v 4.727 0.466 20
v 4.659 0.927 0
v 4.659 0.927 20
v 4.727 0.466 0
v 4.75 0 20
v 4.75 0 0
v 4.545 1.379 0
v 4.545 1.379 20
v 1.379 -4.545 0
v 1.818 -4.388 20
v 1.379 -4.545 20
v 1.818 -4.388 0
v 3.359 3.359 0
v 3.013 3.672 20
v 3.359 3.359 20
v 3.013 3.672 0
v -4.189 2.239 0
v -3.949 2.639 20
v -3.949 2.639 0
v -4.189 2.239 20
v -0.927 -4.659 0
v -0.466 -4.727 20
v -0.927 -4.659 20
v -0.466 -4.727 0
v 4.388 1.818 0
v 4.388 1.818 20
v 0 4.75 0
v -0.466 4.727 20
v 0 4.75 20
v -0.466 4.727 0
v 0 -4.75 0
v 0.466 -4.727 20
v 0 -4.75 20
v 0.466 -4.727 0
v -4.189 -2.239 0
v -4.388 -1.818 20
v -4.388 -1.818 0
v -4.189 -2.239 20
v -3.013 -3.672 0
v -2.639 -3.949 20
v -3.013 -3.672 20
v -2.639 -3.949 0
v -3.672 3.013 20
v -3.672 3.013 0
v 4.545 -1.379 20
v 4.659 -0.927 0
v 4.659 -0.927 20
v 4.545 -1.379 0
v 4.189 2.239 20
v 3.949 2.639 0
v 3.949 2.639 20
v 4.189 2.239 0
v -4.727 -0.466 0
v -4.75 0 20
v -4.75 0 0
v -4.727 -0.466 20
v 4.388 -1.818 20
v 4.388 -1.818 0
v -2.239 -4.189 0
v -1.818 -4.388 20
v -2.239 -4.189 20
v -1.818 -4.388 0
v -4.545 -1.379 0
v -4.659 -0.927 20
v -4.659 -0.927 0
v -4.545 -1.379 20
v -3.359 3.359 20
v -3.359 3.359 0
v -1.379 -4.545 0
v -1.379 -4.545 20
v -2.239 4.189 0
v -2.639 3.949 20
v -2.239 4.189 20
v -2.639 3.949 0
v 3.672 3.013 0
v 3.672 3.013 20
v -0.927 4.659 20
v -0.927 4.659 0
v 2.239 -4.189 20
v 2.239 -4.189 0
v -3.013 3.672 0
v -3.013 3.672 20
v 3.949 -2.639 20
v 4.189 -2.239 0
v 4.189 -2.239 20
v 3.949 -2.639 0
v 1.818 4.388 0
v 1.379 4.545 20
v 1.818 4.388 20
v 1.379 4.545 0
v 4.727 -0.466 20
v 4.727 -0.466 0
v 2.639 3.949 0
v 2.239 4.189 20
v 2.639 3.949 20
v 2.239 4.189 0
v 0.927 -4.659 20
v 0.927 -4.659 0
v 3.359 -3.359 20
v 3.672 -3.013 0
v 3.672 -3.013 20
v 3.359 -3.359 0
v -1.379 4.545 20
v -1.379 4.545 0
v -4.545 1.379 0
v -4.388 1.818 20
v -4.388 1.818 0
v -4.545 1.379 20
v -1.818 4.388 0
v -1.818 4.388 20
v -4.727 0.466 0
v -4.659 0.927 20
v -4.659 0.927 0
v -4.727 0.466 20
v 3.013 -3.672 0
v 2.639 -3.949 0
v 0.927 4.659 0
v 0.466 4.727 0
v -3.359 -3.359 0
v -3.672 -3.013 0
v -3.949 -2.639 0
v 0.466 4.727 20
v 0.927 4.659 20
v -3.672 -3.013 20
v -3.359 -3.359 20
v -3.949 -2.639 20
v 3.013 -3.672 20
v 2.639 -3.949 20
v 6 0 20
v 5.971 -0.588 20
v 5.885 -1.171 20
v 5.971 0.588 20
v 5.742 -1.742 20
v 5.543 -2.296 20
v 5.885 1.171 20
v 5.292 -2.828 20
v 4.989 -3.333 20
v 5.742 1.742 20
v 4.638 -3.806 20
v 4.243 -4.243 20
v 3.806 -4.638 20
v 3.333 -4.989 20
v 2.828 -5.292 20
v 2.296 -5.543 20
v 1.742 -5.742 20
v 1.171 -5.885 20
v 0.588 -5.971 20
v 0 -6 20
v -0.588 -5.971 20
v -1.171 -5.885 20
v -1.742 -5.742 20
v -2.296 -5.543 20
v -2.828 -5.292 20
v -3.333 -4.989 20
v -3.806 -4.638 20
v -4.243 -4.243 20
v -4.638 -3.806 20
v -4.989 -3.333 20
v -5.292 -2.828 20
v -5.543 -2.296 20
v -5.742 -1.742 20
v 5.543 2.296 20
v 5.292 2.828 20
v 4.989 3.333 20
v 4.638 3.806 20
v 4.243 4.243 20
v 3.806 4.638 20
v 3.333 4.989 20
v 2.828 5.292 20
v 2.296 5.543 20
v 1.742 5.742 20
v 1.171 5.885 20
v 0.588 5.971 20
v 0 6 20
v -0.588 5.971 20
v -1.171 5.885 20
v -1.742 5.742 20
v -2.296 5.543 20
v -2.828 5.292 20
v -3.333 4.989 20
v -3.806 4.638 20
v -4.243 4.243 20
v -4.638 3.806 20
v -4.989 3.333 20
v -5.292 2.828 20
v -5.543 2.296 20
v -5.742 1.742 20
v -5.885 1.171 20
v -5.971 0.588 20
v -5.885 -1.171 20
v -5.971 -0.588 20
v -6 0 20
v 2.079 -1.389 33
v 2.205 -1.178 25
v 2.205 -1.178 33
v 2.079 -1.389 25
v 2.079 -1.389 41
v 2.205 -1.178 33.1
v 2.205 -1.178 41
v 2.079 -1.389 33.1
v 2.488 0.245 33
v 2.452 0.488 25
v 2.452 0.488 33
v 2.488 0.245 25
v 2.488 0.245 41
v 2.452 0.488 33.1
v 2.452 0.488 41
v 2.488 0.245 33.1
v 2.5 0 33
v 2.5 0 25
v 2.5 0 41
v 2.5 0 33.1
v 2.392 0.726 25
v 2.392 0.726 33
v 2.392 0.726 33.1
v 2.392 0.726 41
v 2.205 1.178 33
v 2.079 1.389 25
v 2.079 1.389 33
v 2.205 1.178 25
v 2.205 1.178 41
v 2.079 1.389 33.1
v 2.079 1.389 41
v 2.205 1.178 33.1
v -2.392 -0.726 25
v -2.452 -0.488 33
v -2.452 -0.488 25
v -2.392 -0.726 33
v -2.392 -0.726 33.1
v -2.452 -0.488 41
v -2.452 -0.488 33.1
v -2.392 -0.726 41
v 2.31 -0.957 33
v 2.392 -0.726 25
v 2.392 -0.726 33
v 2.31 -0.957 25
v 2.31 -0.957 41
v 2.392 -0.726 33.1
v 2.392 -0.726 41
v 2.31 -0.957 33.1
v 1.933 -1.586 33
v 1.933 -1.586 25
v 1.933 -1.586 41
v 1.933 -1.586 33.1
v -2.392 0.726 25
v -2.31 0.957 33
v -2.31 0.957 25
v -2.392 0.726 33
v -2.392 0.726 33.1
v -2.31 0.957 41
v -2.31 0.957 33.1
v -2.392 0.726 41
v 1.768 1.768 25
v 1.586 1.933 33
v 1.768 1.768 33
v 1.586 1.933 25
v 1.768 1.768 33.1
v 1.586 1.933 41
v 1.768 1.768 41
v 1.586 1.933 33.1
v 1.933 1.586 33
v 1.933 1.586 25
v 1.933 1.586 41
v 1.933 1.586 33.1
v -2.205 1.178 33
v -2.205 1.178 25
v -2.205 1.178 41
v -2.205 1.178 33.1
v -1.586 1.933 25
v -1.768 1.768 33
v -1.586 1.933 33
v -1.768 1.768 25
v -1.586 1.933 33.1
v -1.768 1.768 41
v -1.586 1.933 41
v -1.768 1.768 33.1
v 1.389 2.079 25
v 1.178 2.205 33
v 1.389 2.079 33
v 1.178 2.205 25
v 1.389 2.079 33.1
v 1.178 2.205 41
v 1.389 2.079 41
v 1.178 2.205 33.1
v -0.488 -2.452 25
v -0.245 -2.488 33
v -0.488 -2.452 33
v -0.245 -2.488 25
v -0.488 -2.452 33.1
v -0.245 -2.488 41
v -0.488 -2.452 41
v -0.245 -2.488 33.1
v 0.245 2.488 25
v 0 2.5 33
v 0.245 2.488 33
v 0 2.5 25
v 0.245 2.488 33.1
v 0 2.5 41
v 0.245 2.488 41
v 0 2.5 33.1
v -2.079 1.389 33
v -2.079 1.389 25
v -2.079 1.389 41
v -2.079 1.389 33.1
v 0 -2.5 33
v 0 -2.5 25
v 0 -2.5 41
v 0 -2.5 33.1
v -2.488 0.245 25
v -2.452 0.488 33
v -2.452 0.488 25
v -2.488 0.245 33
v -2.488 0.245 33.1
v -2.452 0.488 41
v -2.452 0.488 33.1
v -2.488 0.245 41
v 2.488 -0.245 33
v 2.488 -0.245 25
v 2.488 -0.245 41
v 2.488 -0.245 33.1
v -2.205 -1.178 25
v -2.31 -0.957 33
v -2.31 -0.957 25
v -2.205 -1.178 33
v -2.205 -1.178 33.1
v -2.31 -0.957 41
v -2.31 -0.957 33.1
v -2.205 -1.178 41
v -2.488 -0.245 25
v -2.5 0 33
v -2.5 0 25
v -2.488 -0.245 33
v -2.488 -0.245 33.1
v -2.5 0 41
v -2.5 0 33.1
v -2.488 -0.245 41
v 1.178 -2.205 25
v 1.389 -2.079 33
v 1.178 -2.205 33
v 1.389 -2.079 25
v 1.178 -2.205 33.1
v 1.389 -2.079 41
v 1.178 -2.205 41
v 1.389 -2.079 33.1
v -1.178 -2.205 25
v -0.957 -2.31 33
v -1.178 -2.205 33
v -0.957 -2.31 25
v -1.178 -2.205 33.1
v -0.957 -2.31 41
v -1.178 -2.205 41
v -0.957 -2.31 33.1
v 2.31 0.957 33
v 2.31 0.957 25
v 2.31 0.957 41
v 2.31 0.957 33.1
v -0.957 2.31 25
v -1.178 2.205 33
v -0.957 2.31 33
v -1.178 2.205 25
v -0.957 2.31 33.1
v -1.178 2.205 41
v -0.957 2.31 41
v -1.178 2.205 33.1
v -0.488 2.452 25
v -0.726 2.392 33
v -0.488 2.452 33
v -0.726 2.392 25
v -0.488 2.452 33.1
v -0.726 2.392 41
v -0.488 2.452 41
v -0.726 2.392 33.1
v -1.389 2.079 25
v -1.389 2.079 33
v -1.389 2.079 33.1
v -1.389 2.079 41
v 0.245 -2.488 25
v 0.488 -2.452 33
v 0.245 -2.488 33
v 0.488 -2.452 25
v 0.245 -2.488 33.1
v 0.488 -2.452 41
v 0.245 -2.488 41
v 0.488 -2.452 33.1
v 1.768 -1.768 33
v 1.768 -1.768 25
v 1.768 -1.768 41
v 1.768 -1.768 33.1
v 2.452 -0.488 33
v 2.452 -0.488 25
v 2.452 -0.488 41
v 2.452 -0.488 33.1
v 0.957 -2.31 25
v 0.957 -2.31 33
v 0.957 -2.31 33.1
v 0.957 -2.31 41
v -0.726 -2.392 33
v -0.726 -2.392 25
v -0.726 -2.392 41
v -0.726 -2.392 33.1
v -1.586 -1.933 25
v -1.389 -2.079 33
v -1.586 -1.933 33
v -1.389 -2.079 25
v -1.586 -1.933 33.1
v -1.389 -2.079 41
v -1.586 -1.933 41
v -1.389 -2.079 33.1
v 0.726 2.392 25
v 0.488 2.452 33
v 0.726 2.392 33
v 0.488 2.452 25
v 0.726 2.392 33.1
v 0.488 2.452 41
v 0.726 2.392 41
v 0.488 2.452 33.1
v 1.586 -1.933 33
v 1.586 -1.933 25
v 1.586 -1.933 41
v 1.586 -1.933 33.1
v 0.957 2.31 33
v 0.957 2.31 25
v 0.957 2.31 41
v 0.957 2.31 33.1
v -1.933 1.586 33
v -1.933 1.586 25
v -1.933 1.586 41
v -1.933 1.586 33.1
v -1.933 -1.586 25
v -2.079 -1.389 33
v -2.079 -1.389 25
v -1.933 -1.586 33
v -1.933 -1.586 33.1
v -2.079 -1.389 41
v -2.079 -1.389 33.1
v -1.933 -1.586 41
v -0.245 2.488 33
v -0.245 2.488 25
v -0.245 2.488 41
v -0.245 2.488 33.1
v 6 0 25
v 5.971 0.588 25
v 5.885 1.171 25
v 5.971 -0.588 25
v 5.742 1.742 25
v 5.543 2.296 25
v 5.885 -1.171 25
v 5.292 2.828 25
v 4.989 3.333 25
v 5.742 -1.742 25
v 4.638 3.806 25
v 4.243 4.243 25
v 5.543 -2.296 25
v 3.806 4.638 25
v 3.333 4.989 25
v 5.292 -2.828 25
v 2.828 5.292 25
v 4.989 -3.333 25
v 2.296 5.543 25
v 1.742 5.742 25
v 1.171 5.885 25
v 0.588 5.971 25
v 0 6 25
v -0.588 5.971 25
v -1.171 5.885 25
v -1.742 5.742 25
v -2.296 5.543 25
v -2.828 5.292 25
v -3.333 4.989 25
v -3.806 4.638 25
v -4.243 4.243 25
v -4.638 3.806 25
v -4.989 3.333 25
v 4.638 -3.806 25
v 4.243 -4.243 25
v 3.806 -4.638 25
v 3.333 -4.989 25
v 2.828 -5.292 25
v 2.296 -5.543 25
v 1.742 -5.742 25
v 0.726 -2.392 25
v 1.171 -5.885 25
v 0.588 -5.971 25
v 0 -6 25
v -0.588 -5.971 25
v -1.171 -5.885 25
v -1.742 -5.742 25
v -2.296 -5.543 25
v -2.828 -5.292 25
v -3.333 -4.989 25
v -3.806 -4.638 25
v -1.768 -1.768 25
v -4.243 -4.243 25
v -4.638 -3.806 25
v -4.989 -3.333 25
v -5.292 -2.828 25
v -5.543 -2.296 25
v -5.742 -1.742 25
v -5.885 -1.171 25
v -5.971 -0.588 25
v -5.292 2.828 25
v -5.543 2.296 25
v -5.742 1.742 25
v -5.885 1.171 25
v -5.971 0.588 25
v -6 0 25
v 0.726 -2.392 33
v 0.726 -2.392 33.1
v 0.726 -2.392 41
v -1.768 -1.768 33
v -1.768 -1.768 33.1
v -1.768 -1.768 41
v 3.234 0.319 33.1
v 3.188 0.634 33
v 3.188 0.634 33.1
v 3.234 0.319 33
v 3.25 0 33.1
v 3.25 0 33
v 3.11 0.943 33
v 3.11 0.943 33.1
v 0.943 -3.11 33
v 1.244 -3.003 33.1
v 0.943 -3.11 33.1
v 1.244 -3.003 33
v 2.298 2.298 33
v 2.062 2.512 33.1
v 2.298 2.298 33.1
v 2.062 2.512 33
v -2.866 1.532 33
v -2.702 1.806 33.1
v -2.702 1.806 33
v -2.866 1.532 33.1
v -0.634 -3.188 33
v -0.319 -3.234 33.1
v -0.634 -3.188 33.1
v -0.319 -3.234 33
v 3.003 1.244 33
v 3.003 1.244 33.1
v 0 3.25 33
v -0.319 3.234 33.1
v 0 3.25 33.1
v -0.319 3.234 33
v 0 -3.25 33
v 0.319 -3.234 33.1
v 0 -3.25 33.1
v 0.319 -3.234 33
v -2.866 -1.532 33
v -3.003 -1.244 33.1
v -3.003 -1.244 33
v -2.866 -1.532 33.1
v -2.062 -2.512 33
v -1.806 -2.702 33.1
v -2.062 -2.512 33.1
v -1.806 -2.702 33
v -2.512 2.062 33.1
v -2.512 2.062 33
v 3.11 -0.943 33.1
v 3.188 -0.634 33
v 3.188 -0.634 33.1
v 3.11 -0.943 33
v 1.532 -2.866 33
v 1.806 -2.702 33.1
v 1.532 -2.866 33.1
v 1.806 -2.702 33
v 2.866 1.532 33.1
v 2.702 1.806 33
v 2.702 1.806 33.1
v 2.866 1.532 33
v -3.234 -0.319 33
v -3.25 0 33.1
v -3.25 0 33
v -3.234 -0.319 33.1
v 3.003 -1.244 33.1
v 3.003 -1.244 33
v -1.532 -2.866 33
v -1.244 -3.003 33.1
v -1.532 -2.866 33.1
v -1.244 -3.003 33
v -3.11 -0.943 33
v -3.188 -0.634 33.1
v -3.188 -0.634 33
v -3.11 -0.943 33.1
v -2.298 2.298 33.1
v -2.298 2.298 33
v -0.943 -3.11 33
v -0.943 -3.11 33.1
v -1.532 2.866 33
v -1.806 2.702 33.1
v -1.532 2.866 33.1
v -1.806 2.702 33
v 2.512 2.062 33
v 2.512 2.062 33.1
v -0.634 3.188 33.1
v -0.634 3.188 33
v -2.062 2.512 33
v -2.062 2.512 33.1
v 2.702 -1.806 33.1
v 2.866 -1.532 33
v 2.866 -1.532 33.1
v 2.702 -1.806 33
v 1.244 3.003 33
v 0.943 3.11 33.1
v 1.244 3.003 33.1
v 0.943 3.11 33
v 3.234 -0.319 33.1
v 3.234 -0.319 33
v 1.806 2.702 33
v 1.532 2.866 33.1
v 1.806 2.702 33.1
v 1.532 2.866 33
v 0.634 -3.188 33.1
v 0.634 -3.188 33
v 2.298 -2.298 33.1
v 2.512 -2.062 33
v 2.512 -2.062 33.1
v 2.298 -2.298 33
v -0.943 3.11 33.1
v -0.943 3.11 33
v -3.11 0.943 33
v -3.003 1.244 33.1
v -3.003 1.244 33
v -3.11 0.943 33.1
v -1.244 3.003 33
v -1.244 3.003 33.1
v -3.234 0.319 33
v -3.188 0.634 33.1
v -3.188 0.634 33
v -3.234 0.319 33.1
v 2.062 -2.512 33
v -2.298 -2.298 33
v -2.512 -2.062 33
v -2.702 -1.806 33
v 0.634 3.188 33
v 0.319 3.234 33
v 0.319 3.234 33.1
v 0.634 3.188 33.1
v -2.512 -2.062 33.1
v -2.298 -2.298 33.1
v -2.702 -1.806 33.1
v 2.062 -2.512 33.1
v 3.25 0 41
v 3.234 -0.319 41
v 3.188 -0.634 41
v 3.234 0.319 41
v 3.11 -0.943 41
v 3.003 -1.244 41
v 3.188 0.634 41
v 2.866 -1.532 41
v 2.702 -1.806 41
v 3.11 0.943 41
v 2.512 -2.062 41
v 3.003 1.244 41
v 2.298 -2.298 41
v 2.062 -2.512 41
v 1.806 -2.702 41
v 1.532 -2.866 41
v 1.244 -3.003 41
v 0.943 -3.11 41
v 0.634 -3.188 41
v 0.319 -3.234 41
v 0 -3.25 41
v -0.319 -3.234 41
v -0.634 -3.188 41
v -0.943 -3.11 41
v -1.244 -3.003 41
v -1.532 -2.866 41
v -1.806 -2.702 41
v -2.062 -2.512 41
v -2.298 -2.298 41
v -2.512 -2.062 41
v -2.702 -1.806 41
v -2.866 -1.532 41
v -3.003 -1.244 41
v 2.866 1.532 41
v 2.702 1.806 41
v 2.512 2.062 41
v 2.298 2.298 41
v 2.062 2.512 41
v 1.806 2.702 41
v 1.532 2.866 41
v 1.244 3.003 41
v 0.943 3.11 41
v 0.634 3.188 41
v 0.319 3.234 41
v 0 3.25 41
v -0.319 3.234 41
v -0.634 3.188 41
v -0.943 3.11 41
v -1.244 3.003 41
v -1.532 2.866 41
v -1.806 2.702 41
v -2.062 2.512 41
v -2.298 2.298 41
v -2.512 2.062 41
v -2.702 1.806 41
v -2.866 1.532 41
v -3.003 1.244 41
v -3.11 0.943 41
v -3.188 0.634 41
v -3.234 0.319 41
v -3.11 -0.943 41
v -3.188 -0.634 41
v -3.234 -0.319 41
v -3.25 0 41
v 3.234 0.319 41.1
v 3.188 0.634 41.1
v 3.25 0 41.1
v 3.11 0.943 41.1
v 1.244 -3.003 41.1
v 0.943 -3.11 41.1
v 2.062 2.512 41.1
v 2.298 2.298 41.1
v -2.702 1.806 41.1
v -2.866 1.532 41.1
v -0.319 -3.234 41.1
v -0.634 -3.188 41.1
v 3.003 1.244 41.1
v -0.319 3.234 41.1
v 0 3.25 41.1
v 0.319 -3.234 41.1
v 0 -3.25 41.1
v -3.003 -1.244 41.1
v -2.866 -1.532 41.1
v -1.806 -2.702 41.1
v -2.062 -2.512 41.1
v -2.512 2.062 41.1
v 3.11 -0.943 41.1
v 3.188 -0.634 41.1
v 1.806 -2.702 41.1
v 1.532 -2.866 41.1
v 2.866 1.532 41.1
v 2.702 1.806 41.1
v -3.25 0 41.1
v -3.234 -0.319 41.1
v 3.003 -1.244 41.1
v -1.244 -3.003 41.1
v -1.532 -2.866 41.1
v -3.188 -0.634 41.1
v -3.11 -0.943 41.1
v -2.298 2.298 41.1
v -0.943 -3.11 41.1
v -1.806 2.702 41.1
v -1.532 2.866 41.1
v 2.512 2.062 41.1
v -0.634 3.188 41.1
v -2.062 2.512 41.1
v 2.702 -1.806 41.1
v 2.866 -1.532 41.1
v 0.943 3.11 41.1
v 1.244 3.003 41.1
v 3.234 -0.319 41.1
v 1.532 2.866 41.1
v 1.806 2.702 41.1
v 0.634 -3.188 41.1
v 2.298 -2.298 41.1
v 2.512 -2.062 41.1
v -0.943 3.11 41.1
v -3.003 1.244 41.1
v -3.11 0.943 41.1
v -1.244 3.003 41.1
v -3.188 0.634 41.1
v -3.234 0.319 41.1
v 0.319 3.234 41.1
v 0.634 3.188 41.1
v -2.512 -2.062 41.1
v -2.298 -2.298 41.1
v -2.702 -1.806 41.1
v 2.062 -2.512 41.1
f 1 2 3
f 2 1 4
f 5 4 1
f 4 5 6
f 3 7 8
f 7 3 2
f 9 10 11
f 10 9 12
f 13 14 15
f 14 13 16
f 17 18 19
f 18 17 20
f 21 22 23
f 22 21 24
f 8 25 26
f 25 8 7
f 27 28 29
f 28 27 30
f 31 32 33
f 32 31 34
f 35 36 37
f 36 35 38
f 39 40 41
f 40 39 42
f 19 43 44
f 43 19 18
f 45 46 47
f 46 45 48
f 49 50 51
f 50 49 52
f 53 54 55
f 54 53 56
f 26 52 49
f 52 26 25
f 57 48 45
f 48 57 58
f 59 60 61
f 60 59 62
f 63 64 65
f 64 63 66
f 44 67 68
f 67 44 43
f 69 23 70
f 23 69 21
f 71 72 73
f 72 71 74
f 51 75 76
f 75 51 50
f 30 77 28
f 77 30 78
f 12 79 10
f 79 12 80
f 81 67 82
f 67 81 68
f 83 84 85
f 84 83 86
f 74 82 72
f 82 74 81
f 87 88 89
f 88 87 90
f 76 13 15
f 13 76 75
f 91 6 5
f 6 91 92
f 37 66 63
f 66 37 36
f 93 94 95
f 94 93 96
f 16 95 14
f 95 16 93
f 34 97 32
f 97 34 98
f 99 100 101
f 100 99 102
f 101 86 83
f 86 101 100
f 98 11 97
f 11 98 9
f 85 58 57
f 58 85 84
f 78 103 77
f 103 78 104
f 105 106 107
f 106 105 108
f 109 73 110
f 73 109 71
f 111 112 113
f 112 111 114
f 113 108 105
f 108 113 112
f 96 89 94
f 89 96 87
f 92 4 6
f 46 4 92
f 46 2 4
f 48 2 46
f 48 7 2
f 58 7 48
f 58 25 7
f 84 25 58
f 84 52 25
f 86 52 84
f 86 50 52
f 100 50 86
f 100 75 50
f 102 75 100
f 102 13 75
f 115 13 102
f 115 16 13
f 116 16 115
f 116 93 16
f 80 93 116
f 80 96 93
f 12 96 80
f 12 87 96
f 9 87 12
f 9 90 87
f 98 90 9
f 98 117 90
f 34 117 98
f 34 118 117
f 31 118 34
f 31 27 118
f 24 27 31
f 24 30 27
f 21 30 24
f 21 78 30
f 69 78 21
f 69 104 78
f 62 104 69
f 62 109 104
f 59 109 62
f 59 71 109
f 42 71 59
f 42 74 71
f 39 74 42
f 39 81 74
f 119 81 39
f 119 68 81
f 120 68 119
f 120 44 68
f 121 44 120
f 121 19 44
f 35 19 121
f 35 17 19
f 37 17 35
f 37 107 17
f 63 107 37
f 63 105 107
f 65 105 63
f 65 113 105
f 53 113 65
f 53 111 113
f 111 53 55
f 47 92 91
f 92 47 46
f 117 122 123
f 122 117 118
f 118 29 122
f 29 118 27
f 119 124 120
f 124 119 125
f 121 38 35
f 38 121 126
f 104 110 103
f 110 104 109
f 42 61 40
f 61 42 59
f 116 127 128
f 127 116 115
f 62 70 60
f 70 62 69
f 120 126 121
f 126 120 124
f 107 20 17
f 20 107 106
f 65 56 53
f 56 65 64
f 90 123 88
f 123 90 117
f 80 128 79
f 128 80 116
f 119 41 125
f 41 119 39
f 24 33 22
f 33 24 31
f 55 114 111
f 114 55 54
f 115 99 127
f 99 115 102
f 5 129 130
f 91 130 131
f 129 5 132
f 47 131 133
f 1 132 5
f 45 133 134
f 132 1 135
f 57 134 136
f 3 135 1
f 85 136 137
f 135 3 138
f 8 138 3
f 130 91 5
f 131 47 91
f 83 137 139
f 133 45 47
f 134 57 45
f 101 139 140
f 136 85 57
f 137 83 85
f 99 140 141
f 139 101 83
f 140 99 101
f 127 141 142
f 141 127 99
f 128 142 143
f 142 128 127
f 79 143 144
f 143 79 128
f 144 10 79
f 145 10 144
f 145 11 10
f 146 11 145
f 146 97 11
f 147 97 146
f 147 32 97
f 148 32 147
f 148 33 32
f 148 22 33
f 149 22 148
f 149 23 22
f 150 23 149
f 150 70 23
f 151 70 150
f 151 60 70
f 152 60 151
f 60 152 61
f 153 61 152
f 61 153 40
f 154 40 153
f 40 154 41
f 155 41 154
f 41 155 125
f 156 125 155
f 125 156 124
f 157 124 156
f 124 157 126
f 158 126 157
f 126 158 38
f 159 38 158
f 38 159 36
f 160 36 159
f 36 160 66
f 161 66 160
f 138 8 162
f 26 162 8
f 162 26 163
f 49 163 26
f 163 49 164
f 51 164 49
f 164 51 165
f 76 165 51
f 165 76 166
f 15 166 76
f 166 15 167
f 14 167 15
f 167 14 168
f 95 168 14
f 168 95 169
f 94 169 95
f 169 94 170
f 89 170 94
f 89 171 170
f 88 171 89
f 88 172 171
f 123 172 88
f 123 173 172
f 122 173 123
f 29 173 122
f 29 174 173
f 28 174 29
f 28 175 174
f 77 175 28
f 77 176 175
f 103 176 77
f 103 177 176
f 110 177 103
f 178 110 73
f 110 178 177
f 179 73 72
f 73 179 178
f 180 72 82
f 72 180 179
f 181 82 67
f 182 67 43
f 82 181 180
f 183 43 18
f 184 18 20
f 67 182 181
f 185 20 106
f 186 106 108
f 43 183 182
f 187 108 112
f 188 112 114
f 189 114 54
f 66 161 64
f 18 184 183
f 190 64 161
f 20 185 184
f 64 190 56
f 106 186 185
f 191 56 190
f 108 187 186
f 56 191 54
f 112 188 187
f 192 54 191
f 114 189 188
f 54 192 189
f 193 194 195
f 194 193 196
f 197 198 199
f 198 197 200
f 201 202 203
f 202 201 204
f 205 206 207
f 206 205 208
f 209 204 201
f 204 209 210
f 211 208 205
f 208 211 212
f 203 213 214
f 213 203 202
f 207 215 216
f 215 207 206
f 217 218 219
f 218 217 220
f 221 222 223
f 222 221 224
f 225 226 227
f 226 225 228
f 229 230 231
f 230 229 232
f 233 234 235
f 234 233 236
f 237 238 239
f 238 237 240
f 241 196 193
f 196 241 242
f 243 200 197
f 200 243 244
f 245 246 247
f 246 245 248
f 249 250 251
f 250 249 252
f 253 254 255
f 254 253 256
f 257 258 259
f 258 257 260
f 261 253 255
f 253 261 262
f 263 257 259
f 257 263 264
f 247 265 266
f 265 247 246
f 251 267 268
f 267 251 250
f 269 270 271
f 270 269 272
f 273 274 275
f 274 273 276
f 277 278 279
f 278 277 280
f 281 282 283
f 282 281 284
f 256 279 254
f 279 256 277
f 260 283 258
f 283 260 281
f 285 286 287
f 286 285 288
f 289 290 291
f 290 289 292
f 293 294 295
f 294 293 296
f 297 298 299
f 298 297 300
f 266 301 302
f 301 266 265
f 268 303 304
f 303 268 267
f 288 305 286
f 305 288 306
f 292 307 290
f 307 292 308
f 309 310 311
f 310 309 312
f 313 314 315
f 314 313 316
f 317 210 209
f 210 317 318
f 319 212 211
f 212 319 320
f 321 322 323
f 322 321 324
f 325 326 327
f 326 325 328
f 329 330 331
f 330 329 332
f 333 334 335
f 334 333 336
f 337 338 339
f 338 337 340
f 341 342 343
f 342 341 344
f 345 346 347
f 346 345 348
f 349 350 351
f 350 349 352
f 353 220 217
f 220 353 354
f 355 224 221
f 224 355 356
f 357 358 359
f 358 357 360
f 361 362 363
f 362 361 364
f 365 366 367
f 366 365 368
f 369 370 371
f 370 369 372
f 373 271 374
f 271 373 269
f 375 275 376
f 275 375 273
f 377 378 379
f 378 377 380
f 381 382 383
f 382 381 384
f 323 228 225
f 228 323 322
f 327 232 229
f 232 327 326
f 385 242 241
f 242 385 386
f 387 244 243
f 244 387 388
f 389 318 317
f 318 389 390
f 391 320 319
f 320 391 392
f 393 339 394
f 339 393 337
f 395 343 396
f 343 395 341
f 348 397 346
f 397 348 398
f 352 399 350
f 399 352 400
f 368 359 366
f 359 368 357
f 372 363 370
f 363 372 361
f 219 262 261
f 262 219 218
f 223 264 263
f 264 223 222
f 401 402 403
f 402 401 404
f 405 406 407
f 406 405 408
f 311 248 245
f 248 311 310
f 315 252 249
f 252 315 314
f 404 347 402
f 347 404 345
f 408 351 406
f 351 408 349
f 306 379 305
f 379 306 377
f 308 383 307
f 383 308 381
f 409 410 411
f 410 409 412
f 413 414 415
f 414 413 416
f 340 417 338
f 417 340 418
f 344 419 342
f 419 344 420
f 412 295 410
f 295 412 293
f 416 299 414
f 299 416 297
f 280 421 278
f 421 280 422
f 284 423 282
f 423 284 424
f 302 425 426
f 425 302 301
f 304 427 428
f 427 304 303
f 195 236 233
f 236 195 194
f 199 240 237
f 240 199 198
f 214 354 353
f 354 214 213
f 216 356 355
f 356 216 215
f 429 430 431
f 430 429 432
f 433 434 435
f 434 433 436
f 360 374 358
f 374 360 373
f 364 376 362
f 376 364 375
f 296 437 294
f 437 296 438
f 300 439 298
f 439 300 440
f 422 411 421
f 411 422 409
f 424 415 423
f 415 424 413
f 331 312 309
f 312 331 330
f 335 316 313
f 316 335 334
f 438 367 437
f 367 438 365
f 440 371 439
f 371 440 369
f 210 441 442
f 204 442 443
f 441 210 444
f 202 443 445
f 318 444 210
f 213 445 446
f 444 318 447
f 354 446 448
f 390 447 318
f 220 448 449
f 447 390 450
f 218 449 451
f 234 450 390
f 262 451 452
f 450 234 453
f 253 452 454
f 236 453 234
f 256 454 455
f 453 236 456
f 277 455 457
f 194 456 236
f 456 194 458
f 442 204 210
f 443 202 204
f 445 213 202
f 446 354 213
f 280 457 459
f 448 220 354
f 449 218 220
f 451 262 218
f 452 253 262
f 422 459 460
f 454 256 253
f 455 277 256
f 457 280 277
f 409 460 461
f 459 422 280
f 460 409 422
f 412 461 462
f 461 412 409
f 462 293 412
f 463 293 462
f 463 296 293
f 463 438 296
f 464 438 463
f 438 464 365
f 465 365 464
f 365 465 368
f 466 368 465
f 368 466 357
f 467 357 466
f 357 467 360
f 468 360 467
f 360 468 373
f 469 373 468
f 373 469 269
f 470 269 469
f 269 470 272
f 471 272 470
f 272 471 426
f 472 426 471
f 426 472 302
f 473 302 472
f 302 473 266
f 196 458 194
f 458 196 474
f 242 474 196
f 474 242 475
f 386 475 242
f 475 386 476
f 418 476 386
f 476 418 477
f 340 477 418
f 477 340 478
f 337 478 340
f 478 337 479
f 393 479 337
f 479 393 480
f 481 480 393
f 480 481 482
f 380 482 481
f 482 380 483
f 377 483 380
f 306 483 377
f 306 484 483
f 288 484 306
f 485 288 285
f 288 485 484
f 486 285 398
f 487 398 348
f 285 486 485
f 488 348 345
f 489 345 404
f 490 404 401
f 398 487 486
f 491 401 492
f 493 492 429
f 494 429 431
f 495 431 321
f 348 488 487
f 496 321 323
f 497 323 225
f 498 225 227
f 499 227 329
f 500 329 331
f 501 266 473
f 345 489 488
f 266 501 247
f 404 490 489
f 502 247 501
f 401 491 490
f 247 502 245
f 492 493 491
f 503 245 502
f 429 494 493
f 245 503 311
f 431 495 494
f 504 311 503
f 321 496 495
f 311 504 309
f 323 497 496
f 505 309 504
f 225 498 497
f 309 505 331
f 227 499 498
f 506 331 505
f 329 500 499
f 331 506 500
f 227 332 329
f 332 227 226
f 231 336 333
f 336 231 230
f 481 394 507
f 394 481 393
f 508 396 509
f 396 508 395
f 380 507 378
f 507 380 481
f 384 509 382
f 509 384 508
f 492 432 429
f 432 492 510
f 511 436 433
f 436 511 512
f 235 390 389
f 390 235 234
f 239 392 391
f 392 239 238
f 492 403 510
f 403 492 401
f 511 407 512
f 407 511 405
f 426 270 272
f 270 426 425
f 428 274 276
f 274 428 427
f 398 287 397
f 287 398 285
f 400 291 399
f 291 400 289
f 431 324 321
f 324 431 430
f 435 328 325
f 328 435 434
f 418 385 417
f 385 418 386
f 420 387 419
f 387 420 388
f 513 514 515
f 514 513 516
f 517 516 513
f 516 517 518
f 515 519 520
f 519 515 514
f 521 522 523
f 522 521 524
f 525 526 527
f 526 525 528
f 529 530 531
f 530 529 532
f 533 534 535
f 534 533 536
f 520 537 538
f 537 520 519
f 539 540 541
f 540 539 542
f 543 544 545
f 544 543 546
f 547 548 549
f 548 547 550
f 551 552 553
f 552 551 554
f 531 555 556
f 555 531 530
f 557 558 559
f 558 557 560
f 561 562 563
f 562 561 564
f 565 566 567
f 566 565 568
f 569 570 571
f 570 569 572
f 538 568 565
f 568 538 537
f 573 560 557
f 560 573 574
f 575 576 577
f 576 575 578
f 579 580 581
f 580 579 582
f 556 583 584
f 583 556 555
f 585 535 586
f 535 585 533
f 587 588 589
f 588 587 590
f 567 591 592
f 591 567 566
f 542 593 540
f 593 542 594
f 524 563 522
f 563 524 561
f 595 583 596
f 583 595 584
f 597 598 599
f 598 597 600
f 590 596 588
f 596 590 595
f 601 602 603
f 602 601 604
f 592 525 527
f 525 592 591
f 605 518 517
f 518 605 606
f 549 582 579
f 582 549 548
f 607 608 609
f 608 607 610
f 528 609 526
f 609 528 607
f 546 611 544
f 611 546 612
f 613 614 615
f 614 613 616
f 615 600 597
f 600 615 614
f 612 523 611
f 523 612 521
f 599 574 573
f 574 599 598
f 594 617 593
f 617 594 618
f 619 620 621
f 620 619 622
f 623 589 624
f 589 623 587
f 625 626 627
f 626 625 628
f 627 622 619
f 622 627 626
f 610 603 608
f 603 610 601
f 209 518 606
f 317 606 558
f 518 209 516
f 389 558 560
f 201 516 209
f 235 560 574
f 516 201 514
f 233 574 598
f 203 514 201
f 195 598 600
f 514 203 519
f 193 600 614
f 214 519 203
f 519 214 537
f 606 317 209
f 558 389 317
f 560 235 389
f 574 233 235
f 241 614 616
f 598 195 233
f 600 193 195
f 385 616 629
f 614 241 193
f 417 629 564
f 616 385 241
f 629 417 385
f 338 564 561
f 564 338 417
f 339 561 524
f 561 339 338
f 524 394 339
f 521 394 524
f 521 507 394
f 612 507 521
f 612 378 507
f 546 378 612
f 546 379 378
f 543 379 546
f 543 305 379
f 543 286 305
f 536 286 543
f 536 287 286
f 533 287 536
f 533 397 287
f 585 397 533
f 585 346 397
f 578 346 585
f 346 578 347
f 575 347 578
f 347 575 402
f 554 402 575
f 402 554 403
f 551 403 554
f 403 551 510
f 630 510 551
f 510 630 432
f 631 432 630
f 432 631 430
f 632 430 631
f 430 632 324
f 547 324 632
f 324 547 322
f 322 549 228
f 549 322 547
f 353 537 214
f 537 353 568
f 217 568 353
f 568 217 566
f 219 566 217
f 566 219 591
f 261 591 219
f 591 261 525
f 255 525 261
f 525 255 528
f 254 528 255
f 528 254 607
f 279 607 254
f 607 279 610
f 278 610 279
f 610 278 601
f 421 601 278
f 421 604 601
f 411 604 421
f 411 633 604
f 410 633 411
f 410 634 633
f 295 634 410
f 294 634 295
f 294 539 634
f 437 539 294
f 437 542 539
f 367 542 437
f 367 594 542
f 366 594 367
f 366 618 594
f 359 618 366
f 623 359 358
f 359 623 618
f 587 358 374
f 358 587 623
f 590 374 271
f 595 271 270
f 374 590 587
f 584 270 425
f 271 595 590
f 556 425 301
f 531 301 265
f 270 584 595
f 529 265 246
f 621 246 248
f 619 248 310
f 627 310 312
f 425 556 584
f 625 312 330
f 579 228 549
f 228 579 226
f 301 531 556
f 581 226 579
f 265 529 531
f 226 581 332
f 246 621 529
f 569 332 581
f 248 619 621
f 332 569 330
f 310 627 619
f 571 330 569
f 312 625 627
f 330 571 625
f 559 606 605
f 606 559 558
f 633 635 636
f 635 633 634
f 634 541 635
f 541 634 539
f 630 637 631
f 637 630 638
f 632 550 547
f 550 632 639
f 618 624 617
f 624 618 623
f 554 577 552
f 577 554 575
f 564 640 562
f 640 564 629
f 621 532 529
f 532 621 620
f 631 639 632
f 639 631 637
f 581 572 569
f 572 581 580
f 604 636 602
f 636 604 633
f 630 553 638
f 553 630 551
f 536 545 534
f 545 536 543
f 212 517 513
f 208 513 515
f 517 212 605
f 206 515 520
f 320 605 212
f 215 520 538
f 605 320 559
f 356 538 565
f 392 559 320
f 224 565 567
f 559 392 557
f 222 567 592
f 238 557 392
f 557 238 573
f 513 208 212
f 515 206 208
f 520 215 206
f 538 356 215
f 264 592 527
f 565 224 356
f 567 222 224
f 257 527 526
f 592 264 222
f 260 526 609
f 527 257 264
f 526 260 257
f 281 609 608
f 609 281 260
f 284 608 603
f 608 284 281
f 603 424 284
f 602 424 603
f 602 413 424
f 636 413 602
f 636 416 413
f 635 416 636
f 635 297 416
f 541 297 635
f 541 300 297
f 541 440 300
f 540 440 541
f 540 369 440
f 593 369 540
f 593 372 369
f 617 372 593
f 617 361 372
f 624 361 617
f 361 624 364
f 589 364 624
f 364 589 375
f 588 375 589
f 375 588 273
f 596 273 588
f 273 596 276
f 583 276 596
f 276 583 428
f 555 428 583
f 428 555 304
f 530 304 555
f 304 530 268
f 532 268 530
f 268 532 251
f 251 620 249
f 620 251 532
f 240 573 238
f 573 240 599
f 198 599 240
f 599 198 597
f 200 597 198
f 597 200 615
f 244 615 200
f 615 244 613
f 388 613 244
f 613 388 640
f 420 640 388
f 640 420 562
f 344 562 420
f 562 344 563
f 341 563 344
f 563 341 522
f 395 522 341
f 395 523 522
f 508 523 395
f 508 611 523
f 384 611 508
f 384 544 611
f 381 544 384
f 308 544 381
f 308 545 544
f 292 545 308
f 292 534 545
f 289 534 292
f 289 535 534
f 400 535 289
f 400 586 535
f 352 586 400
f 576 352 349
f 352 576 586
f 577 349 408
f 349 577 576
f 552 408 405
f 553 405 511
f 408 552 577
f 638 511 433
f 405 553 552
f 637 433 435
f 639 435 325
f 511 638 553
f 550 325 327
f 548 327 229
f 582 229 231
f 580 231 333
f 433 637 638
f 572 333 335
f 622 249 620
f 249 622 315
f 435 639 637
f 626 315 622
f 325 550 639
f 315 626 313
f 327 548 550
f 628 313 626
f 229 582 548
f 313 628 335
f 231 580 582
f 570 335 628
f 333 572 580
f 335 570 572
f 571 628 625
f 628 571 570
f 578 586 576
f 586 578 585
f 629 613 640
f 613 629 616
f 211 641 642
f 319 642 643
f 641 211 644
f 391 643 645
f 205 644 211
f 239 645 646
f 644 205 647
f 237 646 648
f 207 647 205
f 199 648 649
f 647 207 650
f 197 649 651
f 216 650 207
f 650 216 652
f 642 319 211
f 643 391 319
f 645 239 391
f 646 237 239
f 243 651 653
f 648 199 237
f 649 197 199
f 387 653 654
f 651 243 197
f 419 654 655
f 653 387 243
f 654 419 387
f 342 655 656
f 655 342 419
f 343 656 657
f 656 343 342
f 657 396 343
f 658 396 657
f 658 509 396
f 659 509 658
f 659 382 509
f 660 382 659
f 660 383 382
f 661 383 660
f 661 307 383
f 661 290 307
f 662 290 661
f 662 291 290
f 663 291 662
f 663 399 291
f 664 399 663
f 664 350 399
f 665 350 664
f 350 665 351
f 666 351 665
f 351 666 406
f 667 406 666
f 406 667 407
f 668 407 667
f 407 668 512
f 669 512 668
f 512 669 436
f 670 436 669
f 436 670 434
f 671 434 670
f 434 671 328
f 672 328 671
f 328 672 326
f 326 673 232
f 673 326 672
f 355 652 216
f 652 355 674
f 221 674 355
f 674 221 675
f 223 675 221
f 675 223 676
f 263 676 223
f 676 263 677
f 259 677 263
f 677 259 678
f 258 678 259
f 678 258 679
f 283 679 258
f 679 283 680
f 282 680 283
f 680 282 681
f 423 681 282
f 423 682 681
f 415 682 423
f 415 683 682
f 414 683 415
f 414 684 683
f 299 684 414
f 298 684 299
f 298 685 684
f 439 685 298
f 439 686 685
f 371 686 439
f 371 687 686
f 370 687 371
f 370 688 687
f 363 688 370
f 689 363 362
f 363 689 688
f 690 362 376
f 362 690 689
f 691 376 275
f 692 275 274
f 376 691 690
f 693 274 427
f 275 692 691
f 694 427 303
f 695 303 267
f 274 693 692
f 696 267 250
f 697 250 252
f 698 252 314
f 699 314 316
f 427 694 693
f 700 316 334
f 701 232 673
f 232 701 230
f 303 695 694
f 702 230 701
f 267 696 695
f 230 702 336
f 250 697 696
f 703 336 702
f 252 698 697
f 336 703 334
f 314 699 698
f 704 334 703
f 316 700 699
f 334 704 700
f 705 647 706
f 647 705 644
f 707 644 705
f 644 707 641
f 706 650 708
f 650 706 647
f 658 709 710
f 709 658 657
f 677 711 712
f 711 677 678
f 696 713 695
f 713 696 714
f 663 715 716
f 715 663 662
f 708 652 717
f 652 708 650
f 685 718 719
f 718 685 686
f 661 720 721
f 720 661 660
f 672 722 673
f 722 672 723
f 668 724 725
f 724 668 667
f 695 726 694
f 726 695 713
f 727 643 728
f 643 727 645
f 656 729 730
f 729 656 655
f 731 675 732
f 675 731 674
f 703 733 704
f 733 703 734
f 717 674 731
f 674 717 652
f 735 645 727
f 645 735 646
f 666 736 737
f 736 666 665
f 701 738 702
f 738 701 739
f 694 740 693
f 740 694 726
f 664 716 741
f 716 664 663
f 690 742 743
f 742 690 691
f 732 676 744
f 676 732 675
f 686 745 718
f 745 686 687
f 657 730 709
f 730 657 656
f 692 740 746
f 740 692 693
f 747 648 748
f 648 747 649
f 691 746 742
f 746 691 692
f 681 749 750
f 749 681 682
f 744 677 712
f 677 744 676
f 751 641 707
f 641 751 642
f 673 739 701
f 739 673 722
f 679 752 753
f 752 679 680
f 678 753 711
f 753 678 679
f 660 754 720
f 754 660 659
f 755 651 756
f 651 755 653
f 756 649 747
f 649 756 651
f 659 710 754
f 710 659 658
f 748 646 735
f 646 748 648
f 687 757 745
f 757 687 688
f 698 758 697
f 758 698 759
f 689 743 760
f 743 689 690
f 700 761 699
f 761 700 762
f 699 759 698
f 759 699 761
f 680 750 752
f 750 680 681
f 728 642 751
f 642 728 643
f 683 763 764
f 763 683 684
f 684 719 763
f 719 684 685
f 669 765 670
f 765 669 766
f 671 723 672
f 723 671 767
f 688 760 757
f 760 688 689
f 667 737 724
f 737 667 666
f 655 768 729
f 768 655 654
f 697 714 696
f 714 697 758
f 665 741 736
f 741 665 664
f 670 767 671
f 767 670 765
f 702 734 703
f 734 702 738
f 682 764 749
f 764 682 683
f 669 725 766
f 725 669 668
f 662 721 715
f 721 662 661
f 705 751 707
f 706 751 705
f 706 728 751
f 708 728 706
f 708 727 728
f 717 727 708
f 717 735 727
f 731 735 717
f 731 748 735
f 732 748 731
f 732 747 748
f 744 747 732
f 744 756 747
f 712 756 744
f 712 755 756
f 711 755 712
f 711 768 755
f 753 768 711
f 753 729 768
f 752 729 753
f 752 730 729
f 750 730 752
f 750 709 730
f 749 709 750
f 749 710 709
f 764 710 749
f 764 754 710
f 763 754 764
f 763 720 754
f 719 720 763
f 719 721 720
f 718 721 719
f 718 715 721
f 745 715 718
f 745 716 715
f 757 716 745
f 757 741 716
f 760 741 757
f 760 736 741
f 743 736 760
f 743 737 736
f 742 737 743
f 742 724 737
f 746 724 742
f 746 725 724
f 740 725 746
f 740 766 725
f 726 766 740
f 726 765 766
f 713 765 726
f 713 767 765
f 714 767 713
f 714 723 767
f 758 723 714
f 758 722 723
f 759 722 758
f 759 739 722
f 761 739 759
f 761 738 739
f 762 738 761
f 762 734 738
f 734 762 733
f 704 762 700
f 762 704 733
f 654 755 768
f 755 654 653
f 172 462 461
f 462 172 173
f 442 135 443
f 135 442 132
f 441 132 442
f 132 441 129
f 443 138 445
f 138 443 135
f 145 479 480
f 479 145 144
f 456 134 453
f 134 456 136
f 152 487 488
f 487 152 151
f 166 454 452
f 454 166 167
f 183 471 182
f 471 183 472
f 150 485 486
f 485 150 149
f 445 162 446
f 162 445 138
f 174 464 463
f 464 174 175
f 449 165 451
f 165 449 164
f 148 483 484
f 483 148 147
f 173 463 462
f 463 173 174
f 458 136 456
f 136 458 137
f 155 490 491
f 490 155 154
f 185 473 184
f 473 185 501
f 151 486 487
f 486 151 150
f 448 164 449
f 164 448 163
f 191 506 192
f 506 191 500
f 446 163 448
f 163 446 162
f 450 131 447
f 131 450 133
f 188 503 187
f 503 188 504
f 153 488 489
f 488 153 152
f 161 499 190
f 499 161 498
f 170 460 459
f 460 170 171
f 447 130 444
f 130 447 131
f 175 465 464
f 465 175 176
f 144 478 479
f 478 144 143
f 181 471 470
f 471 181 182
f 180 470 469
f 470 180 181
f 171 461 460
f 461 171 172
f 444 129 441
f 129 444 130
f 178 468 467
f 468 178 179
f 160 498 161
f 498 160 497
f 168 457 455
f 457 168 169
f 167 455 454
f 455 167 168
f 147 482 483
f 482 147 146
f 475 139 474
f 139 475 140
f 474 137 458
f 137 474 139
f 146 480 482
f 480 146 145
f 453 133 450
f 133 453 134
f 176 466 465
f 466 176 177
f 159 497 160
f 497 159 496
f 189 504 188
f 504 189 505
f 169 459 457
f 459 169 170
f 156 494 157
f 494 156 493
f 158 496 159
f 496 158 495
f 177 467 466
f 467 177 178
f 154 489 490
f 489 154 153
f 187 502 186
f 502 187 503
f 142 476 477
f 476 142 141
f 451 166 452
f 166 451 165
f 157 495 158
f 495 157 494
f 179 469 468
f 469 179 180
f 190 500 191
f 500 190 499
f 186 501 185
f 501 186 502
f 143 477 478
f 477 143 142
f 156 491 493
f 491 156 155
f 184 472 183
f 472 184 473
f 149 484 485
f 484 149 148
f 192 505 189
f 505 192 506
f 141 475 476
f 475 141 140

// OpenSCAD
// Hose-barb reducer
// 8mm ID to 5mm ID
// Print upright along Z axis

// Dimensions
barb_height_8mm = 10; // height of barbs for 8mm tubing
barb_top_diameter_8mm = 9.5; // top diameter of 8mm barbs
barb_bottom_diameter_8mm = 7.5; // bottom diameter of 8mm barbs
barb_step_diameter_8mm = 7.5; // step back diameter of 8mm barbs

barb_height_5mm = 8; // height of barbs for 5mm tubing
barb_top_diameter_5mm = 5.0; // top diameter of 5mm barbs
barb_bottom_diameter_5mm = 6.5; // bottom diameter of 5mm barbs
barb_step_diameter_5mm = 6.5; // step back diameter of 5mm barbs

collar_diameter = 12; // diameter of collar
collar_height = 5; // height of collar

inner_diameter = 3; // bore diameter
outer_diameter_8mm = 9.5; // outer diameter for 8mm tubing
outer_diameter_5mm = 5.0; // outer diameter for 5mm tubing

// Main body
union() {
  // 8mm barbs
  for (i = [0, 1]) {
    translate([0, 0, i * barb_height_8mm])
    cylinder(h = barb_height_8mm, r = barb_top_diameter_8mm / 2, $fn = 64);
    
    translate([0, 0, i * barb_height_8mm + barb_height_8mm])
    cylinder(h = 0.1, r = barb_step_diameter_8mm / 2, $fn = 64);
  }
  
  // Collar
  translate([0, 0, 20])
  cylinder(h = collar_height, r = collar_diameter / 2, $fn = 64);
  
  // 5mm barbs
  for (i = [0, 1]) {
    translate([0, 0, 25 + i * barb_height_5mm])
    cylinder(h = barb_height_5mm, r = barb_top_diameter_5mm / 2, $fn = 64);
    
    translate([0, 0, 25 + i * barb_height_5mm + barb_height_5mm])
    cylinder(h = 0.1, r = barb_step_diameter_5mm / 2, $fn = 64);
  }
  
  // Central bore
  cylinder(h = 41, r = inner_diameter / 2, $fn = 64);
}
